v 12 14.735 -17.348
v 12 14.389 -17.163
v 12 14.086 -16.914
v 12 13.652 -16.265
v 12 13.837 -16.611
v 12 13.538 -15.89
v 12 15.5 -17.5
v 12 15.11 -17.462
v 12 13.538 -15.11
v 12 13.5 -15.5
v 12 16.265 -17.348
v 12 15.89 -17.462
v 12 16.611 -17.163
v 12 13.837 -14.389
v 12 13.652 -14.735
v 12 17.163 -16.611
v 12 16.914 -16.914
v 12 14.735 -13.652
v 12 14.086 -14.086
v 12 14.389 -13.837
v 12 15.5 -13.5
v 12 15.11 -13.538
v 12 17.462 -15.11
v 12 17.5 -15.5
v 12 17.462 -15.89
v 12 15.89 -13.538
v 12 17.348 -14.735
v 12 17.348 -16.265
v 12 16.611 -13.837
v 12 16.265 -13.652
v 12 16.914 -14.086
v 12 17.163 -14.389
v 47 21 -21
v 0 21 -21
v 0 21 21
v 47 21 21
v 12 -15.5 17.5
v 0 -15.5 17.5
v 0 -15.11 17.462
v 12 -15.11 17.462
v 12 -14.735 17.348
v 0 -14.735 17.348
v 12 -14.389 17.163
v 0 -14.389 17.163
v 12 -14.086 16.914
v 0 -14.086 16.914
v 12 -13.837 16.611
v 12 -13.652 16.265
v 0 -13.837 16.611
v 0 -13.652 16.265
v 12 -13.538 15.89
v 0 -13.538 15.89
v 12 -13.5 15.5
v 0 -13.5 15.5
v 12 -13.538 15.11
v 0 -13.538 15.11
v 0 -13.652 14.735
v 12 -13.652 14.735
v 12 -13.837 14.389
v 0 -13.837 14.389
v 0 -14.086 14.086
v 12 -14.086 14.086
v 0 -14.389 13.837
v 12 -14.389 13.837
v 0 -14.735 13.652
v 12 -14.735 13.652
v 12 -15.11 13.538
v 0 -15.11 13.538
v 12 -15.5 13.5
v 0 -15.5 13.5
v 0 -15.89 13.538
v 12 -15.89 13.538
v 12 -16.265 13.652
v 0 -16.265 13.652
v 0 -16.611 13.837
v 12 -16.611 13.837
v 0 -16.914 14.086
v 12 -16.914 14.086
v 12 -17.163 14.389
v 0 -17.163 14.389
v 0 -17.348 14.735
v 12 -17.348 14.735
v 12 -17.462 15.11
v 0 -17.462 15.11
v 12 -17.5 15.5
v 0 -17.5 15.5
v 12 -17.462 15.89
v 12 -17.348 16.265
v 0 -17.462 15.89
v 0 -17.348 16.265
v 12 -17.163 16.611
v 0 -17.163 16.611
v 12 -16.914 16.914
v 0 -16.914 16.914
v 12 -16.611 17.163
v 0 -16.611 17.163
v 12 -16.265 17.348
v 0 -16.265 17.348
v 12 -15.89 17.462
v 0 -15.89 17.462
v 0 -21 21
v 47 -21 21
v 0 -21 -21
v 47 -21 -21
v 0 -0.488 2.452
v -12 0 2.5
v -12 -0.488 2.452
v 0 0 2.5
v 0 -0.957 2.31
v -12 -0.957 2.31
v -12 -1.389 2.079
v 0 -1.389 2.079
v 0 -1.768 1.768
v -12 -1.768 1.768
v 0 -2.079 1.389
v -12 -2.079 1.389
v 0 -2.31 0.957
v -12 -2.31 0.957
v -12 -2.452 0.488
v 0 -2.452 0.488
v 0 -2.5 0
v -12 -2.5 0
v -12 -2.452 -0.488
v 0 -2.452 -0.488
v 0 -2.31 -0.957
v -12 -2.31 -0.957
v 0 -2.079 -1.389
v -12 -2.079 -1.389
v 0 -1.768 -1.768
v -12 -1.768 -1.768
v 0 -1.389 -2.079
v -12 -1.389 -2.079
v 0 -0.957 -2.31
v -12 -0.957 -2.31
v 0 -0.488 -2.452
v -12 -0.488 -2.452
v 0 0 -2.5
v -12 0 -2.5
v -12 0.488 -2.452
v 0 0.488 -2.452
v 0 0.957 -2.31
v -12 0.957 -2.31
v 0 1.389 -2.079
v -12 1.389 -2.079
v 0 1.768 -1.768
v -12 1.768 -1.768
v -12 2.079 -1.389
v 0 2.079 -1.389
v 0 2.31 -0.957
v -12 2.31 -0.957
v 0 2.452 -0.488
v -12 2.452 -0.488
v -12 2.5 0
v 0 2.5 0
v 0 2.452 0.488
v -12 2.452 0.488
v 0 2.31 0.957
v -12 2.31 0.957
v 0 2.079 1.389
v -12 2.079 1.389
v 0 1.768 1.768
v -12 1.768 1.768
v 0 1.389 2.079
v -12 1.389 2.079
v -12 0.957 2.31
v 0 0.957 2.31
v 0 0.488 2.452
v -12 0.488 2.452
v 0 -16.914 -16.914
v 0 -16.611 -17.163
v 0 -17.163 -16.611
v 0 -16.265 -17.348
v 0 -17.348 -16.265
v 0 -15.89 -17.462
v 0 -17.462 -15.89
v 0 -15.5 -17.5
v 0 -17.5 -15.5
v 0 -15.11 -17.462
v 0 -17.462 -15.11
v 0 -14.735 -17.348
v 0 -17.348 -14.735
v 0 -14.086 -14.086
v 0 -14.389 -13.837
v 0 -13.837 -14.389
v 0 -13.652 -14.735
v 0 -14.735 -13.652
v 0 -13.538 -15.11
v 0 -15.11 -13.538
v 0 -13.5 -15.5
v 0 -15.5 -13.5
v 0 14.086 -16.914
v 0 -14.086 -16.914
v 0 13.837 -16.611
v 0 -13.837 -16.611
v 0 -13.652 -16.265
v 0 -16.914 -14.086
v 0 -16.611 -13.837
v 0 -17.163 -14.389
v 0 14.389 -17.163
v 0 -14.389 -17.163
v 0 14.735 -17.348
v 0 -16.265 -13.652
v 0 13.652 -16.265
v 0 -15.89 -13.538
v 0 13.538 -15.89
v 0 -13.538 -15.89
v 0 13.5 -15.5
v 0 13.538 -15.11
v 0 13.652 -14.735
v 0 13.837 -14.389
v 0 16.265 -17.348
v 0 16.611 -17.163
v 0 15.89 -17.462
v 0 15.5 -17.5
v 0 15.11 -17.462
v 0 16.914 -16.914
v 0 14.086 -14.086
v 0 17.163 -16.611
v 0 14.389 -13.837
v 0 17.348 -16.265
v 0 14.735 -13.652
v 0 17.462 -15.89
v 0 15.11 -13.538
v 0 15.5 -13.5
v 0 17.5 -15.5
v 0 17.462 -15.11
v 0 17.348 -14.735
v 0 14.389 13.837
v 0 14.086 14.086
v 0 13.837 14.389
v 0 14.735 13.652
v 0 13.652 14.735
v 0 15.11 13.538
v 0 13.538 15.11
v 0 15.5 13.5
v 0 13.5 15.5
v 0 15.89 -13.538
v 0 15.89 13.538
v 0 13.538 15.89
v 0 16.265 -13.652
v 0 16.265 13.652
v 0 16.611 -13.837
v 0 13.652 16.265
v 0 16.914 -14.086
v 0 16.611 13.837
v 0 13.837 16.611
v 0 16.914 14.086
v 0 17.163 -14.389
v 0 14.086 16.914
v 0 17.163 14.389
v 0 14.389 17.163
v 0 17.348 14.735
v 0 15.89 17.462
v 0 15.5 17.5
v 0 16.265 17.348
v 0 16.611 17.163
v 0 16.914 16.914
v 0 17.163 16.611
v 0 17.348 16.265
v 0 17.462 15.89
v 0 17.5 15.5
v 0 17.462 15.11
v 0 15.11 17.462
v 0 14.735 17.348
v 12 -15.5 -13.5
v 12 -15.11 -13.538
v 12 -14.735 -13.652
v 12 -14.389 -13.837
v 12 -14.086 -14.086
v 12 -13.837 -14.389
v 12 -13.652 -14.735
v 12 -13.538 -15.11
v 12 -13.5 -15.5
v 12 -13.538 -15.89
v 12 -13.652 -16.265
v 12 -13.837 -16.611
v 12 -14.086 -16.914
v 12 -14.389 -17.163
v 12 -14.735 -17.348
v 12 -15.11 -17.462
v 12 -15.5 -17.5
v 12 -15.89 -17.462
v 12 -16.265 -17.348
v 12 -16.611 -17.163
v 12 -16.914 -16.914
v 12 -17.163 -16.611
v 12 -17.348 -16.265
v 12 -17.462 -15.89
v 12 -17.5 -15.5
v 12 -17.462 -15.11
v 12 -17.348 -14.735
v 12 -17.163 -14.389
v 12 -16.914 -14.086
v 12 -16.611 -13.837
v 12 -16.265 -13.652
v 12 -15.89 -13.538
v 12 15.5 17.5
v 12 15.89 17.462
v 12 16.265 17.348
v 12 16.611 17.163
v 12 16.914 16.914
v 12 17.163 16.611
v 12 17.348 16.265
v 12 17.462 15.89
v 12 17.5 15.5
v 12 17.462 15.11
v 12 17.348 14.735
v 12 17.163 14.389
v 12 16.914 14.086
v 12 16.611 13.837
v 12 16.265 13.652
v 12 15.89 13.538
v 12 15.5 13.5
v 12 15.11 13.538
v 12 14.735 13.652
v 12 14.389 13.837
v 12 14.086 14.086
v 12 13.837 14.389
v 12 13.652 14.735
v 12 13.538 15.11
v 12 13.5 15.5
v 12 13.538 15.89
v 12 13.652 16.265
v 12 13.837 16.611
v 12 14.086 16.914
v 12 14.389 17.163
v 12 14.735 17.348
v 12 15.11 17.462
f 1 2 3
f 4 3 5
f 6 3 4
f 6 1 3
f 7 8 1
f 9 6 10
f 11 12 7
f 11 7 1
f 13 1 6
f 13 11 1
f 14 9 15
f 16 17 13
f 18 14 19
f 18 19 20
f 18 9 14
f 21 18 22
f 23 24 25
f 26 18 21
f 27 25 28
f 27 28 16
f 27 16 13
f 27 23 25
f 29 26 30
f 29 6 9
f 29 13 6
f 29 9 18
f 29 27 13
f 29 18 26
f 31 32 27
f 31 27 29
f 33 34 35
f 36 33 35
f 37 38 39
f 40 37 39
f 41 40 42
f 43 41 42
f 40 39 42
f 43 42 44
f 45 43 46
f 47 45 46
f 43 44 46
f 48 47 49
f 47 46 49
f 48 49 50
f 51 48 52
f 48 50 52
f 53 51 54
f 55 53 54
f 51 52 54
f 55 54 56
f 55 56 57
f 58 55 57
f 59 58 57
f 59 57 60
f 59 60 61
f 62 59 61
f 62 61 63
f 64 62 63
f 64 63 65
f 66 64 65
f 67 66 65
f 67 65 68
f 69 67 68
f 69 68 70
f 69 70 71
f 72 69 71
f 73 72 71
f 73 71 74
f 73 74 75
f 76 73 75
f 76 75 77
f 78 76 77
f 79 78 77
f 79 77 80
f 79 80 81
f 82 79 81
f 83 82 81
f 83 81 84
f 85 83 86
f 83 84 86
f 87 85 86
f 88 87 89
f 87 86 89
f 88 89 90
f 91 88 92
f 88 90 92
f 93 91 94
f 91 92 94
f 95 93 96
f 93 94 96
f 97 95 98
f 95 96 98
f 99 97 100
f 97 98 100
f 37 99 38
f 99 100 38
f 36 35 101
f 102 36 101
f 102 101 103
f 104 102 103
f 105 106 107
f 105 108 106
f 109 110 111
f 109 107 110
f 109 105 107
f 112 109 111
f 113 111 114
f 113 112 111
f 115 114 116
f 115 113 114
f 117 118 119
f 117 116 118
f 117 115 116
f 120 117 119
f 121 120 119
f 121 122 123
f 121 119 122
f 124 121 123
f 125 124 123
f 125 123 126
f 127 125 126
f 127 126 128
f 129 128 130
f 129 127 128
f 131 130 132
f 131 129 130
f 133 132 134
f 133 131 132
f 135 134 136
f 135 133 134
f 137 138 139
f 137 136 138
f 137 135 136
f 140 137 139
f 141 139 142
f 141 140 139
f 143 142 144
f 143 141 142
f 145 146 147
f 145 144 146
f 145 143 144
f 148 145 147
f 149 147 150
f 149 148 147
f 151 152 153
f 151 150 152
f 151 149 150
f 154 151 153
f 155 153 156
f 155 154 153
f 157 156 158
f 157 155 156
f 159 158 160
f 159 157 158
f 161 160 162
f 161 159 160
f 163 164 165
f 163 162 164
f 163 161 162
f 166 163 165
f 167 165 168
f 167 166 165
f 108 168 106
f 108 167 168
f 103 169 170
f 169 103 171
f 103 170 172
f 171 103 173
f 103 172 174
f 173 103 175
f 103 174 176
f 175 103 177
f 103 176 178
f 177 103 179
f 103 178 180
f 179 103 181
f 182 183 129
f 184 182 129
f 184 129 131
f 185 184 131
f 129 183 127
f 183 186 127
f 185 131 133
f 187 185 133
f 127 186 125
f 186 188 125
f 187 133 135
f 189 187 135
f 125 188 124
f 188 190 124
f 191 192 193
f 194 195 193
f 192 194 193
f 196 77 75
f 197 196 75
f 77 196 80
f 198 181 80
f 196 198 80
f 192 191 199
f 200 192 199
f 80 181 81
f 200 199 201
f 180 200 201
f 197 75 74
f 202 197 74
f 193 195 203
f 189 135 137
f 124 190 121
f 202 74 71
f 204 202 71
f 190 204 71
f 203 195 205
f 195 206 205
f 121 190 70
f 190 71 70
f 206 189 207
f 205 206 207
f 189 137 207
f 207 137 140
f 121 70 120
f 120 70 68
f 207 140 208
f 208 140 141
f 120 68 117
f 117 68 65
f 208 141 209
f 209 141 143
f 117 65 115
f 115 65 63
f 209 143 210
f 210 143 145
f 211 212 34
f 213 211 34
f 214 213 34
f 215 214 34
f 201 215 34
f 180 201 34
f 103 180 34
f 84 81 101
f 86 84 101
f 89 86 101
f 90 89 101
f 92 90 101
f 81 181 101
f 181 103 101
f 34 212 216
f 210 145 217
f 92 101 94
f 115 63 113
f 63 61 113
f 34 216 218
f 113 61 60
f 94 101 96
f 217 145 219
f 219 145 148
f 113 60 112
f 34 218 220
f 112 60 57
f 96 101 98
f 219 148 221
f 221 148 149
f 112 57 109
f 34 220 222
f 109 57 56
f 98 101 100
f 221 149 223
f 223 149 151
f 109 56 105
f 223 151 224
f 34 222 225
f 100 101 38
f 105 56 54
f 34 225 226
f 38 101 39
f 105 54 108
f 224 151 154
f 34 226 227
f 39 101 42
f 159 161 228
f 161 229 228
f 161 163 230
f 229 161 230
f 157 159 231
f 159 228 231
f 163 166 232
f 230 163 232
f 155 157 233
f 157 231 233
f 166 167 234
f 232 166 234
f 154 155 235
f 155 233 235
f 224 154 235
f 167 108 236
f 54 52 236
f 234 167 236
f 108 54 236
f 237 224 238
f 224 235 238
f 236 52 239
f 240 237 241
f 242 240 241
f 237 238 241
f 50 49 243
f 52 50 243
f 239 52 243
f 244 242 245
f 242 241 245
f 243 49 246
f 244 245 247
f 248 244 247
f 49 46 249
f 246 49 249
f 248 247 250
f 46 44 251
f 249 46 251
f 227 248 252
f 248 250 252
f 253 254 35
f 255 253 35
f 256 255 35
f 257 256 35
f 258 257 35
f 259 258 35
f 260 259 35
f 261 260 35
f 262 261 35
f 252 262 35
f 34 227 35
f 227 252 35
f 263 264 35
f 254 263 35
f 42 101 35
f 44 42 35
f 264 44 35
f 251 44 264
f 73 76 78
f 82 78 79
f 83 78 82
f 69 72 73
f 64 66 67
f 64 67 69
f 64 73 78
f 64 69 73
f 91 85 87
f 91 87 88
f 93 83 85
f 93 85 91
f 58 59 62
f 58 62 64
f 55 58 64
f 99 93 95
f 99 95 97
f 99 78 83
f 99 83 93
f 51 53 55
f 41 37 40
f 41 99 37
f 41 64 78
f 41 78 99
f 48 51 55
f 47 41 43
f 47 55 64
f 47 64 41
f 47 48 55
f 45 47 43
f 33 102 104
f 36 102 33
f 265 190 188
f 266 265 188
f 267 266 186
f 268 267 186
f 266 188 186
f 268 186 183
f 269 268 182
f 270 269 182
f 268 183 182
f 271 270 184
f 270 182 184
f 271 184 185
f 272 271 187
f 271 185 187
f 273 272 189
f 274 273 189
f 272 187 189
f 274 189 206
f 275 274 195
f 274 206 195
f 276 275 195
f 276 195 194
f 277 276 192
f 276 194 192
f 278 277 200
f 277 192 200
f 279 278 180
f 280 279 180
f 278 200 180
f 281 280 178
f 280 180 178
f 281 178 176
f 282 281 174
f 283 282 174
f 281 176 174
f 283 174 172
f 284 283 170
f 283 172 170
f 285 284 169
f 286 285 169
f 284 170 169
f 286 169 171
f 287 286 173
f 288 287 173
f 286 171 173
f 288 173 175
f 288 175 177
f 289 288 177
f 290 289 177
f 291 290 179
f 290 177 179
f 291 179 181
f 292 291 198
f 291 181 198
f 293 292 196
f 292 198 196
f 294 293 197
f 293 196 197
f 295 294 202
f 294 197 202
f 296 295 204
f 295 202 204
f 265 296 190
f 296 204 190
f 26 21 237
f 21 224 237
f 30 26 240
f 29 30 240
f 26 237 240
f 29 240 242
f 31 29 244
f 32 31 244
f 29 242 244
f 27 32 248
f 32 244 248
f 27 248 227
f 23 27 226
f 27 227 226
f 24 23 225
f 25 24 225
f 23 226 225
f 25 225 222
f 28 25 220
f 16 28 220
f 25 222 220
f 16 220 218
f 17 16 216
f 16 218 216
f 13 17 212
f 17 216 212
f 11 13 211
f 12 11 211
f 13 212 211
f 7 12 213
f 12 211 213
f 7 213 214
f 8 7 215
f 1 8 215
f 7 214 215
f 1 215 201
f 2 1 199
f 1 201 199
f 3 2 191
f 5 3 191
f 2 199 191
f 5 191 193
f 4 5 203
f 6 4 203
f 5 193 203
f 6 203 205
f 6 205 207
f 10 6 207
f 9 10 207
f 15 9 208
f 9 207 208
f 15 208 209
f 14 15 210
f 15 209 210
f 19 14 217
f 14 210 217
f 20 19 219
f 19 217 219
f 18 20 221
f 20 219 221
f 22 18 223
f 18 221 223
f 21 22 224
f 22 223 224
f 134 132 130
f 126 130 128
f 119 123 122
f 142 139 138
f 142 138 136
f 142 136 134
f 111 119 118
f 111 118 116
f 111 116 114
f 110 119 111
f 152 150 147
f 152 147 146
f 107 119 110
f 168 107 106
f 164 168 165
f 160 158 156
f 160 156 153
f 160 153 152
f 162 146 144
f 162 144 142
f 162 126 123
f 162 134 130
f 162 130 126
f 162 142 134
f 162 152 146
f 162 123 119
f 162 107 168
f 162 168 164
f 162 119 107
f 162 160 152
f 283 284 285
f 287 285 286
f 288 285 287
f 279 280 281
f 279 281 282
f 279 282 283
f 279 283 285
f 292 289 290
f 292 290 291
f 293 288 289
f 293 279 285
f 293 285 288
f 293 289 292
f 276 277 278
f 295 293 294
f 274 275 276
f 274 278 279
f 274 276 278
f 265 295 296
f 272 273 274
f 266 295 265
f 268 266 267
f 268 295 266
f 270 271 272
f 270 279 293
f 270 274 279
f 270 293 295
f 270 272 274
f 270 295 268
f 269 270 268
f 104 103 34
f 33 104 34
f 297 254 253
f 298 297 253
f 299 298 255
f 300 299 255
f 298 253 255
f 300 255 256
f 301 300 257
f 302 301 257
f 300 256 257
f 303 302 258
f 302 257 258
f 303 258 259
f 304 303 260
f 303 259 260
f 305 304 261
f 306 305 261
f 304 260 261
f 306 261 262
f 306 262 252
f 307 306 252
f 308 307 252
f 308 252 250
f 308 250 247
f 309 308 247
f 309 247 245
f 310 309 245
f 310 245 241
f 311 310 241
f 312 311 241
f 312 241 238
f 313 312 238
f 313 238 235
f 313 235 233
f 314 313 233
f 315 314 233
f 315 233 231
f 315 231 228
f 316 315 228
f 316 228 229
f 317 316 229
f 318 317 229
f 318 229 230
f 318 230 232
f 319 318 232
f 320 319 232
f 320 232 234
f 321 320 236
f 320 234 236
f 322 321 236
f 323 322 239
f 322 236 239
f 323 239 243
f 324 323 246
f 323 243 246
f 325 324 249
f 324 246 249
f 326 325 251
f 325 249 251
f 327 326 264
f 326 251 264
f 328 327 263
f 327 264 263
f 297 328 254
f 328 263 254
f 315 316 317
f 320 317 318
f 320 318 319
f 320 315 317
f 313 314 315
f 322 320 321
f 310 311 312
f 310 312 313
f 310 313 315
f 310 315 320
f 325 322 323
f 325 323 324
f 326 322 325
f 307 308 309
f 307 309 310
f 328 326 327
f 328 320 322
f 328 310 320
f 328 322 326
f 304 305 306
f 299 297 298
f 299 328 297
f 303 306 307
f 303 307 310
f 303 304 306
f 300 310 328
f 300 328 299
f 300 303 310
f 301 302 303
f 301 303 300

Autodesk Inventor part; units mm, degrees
ref_plane "YZ Plane" through (0, 0, 0) normal (1, 0, 0) x (0, 1, 0)
ref_plane "XZ Plane" through (0, 0, 0) normal (0, 1, 0) x (-1, 0, 0)
ref_plane "XY Plane" through (0, 0, 0) normal (0, 0, 1) x (1, 0, 0)
sketch "Sketch1" plane through (0, 0, 0) normal (1, 0, 0) x (0, 1, 0)
  line L0 (21, 21) -> (-21, 21)
  line L1 (-21, 21) -> (-21, -21)
  line L2 (-21, -21) -> (21, -21)
  line L3 (21, -21) -> (21, 21)
  point P0 (0, 0)
  point P1 (0, 21)
  point P2 (21, 0)
  dimension "d0" = 42
  dimension "d1" = 42
extrude "Extrusion1" add sketch "Sketch1" along normal blind 47
sketch "Sketch2" plane through (0, 0, 0) normal (-1, 0, 0) x (0, 0, 1)
  circle A0 centre (0, 0) radius 2.5
  dimension "d4" = 5
extrude "Extrusion2" add sketch "Sketch2" along normal blind 12
sketch "Sketch3" plane through (0, 0, 0) normal (-1, 0, 0) x (0, 0, 1)
  circle A0 centre (15.5, 15.5) radius 2
  line L0 (-13.7584, 0) -> (4.183, 0) construction
  line L1 (0, 11.541) -> (0, -2.5) construction
  circle A1 centre (0, 0) radius 2.5 construction
  circle A2 centre (15.5, -15.5) radius 2
  circle A3 centre (-15.5, 15.5) radius 2
  circle A4 centre (-15.5, -15.5) radius 2
  dimension "d7" = 15.5
  dimension "d8" = 15.5
  dimension "d9" = 4
extrude "Extrusion3" cut sketch "Sketch3" against normal blind 12
properties part number "NEMA 17 Completely Correct"
